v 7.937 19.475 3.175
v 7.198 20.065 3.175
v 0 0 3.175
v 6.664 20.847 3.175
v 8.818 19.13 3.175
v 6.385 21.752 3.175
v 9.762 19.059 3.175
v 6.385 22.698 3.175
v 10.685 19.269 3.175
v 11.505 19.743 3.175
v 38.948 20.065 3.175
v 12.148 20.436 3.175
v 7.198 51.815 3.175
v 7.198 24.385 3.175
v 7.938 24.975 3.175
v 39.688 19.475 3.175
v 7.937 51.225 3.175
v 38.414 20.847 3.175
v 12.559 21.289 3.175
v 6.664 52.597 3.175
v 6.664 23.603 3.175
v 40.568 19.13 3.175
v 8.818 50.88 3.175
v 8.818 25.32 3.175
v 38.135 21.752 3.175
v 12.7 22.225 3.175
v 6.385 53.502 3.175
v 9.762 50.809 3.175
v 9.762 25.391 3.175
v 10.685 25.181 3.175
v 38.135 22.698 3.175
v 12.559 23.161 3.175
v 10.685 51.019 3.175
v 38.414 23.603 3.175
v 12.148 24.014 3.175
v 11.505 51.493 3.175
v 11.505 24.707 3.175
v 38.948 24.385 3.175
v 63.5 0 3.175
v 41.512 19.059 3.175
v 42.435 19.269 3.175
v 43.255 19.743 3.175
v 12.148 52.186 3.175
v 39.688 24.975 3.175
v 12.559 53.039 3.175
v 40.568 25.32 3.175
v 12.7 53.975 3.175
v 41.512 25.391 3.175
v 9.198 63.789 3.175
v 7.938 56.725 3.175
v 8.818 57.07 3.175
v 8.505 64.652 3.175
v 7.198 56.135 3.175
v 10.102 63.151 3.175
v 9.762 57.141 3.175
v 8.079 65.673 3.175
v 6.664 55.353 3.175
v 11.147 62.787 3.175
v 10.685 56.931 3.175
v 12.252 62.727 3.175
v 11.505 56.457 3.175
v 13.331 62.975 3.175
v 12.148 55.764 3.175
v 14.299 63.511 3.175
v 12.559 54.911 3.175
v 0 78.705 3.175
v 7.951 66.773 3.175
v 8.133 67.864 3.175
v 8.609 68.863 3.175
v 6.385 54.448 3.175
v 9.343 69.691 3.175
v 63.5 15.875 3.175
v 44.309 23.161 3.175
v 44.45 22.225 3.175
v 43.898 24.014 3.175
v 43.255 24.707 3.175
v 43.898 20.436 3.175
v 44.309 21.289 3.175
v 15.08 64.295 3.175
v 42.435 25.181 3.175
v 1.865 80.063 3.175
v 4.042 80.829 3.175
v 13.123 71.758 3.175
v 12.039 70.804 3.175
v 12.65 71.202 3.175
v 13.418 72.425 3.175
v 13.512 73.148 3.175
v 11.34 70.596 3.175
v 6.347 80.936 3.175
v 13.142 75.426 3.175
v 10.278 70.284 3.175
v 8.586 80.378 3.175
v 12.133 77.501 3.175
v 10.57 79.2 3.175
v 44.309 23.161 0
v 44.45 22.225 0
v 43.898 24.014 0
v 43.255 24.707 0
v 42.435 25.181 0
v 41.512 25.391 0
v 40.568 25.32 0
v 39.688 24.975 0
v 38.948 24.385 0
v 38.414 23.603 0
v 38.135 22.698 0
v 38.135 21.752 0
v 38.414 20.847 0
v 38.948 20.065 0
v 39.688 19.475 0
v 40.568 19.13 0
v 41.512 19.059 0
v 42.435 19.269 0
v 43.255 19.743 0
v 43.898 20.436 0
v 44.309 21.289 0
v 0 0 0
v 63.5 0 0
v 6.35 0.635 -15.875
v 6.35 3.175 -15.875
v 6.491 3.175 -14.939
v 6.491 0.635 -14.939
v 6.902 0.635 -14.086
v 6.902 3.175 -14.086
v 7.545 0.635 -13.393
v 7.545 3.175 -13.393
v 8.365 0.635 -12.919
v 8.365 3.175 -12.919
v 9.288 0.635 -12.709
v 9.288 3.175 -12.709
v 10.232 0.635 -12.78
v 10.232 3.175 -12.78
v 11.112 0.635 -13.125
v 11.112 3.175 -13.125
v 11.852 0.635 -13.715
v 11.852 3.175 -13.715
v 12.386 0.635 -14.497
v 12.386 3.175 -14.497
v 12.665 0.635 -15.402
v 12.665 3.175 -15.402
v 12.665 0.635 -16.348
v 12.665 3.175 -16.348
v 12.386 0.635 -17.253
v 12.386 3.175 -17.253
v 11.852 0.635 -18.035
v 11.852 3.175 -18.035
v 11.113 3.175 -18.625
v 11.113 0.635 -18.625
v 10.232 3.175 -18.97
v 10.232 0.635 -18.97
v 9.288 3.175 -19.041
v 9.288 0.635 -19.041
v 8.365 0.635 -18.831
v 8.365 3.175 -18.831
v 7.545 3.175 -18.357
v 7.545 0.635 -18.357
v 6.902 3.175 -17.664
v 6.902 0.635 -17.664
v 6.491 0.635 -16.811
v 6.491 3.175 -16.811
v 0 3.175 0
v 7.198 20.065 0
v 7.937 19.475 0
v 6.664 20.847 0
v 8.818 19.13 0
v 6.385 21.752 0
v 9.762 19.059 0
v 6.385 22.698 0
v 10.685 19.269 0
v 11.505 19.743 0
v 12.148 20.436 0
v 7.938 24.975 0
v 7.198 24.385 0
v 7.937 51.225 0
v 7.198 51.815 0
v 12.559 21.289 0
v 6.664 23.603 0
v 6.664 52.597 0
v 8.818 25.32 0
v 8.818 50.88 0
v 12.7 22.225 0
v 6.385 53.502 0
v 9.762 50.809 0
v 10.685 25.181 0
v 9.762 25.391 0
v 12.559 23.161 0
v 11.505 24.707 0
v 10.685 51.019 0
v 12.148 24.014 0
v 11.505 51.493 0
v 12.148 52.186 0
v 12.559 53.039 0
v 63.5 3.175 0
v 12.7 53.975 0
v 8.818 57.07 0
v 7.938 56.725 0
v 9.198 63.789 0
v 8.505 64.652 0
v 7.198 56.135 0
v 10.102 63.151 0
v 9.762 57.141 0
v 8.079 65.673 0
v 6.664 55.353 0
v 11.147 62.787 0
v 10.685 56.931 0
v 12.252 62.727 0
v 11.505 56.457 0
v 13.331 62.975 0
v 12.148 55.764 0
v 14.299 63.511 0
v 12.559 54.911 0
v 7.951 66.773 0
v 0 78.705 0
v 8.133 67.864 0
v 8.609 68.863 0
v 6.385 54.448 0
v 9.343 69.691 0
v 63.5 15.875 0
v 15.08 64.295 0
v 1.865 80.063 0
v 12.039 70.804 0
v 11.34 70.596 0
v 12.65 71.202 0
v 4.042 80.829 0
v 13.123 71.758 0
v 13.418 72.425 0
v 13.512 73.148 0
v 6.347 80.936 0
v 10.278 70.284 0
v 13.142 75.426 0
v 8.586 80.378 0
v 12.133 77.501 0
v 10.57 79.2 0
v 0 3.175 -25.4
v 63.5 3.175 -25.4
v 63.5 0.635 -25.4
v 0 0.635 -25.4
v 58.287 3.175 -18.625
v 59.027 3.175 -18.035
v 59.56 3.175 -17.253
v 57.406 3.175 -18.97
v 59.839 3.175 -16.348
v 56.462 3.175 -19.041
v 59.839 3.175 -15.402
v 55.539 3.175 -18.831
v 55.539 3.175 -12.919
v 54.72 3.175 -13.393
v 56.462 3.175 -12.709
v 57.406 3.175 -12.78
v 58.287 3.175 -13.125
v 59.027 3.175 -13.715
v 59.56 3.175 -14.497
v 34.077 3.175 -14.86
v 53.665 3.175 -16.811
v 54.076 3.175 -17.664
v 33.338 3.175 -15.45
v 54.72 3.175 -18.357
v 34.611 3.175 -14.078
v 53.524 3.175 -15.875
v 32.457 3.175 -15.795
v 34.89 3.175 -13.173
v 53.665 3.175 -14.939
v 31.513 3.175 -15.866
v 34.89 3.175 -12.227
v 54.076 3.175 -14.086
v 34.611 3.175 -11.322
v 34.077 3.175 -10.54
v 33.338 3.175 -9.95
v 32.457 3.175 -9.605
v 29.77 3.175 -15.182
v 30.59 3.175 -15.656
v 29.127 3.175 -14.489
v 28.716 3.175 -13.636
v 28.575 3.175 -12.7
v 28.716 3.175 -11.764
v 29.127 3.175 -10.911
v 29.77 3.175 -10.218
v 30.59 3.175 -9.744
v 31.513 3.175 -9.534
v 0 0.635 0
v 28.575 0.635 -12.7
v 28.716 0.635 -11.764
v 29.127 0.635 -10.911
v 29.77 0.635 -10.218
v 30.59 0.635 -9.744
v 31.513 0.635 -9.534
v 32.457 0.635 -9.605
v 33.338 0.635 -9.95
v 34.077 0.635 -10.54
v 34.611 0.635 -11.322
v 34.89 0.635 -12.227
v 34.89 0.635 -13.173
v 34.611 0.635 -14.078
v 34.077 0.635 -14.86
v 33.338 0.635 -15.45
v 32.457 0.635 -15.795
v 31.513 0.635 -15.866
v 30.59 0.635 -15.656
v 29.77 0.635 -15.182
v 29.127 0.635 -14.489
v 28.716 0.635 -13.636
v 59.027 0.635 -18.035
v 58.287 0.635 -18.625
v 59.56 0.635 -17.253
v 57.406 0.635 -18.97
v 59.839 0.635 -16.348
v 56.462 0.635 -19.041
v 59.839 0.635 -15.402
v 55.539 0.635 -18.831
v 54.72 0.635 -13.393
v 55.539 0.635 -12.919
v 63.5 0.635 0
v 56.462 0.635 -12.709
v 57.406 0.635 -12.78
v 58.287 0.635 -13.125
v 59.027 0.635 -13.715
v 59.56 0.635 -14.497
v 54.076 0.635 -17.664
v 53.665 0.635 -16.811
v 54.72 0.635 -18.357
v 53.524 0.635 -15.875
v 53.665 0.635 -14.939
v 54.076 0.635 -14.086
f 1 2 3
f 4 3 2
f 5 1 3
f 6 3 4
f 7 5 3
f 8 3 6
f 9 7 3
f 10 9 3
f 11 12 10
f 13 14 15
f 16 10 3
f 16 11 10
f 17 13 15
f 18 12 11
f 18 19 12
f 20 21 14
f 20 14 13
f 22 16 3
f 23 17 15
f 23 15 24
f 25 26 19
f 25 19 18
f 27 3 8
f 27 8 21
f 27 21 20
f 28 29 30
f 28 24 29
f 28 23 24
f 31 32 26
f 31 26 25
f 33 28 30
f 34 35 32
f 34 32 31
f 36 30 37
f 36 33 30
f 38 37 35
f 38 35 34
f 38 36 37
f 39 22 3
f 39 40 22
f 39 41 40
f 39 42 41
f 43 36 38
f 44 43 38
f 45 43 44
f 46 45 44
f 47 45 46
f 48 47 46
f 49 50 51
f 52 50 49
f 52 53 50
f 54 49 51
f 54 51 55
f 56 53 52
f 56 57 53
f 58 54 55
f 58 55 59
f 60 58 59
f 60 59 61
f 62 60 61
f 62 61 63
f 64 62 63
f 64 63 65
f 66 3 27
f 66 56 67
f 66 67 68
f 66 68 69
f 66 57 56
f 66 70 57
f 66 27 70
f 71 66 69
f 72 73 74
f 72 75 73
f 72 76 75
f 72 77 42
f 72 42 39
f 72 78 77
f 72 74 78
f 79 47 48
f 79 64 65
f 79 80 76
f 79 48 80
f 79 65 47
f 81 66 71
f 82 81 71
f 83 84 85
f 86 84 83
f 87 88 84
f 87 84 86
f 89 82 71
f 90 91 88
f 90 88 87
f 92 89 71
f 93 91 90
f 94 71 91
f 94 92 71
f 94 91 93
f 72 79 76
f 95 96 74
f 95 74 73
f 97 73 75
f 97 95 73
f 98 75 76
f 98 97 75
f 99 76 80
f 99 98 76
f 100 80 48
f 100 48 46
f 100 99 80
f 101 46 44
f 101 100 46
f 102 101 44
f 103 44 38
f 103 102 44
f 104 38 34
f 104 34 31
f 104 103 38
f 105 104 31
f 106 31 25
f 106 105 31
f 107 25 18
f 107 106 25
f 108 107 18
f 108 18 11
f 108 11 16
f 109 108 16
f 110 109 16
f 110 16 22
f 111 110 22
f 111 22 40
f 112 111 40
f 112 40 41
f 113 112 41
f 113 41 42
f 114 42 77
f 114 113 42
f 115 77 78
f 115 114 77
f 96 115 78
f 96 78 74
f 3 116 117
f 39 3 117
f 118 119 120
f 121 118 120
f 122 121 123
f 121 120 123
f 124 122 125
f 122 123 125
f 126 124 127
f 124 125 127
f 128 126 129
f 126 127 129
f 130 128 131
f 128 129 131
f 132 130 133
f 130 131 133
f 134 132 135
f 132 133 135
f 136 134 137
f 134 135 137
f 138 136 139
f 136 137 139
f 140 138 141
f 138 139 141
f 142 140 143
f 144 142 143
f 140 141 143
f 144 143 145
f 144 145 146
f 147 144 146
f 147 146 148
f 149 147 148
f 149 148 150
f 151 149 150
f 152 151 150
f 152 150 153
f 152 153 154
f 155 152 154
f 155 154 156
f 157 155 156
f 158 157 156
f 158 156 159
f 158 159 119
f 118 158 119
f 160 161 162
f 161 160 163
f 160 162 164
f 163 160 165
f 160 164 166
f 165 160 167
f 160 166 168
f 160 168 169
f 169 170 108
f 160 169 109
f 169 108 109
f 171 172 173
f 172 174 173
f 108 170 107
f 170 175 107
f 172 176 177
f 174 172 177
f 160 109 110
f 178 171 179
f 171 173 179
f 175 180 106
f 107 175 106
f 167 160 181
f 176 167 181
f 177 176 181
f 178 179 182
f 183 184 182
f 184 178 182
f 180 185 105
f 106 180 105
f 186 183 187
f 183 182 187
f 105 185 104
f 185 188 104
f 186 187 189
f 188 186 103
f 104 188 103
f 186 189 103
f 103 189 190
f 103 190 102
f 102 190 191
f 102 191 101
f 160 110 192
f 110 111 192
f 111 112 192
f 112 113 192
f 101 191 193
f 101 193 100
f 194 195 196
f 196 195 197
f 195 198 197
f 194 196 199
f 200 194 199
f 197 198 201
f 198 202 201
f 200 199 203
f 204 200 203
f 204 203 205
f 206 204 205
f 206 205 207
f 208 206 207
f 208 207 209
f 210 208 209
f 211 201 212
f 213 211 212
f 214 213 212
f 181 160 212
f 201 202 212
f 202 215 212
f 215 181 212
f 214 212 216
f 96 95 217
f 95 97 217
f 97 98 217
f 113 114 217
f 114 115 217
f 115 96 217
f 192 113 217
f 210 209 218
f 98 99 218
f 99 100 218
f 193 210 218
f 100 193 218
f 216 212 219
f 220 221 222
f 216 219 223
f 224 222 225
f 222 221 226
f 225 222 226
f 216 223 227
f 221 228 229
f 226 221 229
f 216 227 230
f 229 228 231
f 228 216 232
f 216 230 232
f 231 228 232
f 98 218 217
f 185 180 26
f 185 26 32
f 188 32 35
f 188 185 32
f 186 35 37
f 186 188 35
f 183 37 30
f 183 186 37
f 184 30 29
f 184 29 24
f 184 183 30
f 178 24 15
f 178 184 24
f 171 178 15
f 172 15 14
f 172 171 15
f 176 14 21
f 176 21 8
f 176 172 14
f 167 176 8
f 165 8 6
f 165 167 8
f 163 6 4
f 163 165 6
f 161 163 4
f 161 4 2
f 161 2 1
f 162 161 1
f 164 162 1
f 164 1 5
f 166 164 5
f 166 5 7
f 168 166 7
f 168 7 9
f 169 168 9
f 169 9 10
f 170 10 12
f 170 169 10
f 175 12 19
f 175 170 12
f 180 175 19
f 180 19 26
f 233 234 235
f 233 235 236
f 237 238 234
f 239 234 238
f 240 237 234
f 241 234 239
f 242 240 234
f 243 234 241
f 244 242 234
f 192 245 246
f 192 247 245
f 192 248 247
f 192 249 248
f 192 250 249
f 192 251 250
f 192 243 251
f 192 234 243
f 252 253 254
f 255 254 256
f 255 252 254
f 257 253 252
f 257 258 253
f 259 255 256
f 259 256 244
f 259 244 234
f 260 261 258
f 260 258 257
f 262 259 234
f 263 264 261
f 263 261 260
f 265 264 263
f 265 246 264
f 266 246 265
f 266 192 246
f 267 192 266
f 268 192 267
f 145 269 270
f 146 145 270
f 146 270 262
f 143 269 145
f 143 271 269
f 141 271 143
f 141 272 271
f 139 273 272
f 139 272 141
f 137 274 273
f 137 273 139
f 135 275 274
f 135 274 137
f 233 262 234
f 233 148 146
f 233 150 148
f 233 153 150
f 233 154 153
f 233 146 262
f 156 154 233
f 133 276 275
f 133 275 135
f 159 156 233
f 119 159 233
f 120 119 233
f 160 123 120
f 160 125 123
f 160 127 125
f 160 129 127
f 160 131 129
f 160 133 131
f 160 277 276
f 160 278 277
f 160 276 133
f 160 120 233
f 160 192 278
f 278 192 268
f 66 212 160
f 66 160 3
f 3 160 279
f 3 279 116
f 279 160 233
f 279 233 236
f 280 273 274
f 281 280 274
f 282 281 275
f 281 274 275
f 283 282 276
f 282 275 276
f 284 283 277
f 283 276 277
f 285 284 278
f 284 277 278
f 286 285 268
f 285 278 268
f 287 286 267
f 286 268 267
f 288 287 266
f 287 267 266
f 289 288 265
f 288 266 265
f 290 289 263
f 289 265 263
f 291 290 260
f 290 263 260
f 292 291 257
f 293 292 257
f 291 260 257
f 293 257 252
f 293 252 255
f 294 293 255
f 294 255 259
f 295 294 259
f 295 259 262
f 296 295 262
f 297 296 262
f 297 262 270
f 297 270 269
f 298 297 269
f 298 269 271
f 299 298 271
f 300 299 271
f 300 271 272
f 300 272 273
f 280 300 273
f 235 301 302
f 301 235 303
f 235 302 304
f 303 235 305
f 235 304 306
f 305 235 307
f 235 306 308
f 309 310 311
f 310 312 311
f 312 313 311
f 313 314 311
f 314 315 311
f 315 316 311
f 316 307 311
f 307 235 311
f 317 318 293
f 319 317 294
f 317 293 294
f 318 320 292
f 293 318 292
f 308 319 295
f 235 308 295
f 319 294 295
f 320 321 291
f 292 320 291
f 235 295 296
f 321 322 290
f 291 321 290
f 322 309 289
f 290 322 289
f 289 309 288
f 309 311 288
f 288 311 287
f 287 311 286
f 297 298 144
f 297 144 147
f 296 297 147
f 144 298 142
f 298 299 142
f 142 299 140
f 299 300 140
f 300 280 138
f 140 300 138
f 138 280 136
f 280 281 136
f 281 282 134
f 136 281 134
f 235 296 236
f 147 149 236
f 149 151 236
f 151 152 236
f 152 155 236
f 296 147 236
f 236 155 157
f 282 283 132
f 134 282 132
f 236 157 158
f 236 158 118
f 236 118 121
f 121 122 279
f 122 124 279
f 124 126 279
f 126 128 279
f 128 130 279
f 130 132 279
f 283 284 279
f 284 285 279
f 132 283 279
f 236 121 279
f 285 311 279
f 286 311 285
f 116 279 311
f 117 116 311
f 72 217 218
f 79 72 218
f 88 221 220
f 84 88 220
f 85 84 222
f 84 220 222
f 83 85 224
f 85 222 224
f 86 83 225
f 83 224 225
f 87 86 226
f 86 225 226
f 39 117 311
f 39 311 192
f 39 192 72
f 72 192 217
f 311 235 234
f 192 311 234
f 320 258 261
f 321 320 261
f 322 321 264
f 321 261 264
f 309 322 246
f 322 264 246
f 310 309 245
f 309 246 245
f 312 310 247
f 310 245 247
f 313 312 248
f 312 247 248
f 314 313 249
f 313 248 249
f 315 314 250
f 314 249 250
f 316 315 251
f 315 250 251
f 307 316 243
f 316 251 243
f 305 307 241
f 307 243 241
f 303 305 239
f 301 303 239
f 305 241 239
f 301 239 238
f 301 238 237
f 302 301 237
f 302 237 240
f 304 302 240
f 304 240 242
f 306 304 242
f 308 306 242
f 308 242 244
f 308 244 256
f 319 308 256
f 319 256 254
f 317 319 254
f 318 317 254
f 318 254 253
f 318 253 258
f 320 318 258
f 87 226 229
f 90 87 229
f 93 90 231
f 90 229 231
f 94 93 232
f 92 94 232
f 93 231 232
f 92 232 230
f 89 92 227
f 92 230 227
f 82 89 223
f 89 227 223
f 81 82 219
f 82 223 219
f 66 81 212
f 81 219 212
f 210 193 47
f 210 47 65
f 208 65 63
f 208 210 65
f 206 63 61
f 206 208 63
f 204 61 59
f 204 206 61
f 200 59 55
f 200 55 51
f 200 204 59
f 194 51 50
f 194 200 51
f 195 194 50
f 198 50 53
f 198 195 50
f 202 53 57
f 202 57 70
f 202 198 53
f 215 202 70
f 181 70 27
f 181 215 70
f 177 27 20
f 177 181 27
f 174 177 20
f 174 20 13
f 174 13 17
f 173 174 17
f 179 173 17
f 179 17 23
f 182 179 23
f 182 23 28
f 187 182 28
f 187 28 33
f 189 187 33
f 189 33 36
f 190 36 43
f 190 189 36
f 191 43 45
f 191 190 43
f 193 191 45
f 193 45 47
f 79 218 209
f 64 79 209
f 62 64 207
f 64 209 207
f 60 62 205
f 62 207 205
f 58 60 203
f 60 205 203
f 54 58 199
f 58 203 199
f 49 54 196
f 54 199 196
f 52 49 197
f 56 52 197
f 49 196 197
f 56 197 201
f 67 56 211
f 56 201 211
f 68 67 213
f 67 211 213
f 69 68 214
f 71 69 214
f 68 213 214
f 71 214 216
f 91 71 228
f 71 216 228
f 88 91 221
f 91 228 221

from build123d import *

# Parameters (mm, degrees)
SKETCH1_R           = 3.175
BOSS_EXTRUDE1_DEPTH = 3.175
SKETCH2_W           = 63.5
SKETCH2_H           = 2.54
EXTRUDE_THIN1_DEPTH = 25.4
SKETCH3_R           = 3.175
CUT_EXTRUDE1_DEPTH  = 25.4


with BuildPart() as part:
    # Sketch1 → Boss-Extrude1 (new body)
    with BuildSketch(Plane.XY):
        with BuildLine():
            Line((0, 0), (63.5, 0))
            Line((63.5, 0), (63.5, 15.875))
            Line((63.5, 15.875), (15.080341671, 64.294658329))
            ThreePointArc((15.080341671, 64.294658329), (8.505408108, 64.65221549), (11.339511683, 70.595737627))
            ThreePointArc((11.339511683, 70.595737627), (12.906539417, 71.462906002), (13.511840983, 73.148482141))
            ThreePointArc((13.511840983, 73.148482141), (8.586326617, 80.377738088), (0, 78.705067014))
            Line((0, 78.705067014), (0, 0))
        make_face()
        with Locations((9.525, 22.225)):
            Circle(SKETCH1_R, mode=Mode.SUBTRACT)
        with Locations((9.525, 53.975)):
            Circle(SKETCH1_R, mode=Mode.SUBTRACT)
        with Locations((41.275, 22.225)):
            Circle(SKETCH1_R, mode=Mode.SUBTRACT)
    extrude(amount=BOSS_EXTRUDE1_DEPTH)

    # Sketch2 → Extrude-Thin1 (add)
    with BuildSketch(Plane(origin=(0, 0, 0), x_dir=(-1, 0, 0), z_dir=(0, 0, -1))):
        with Locations((-31.75, 1.905)):
            Rectangle(SKETCH2_W, SKETCH2_H)
    extrude(amount=EXTRUDE_THIN1_DEPTH)

    # Sketch3 → Cut-Extrude1 (cut)
    with BuildSketch(Plane(origin=(0, 3.175, 0), x_dir=(1, 0, 0), z_dir=(0, 1, 0))):
        with Locations(Location((31.75, 12.7, 0), (0, 0, 180))):
            Circle(SKETCH3_R)
        with Locations(Location((9.525, 15.875, 0), (0, 0, 180))):
            Circle(SKETCH3_R)
        with Locations(Location((56.699380445, 15.875, 0), (0, 0, 180))):
            Circle(SKETCH3_R)
    extrude(amount=-CUT_EXTRUDE1_DEPTH, mode=Mode.SUBTRACT)


solid = part.part
